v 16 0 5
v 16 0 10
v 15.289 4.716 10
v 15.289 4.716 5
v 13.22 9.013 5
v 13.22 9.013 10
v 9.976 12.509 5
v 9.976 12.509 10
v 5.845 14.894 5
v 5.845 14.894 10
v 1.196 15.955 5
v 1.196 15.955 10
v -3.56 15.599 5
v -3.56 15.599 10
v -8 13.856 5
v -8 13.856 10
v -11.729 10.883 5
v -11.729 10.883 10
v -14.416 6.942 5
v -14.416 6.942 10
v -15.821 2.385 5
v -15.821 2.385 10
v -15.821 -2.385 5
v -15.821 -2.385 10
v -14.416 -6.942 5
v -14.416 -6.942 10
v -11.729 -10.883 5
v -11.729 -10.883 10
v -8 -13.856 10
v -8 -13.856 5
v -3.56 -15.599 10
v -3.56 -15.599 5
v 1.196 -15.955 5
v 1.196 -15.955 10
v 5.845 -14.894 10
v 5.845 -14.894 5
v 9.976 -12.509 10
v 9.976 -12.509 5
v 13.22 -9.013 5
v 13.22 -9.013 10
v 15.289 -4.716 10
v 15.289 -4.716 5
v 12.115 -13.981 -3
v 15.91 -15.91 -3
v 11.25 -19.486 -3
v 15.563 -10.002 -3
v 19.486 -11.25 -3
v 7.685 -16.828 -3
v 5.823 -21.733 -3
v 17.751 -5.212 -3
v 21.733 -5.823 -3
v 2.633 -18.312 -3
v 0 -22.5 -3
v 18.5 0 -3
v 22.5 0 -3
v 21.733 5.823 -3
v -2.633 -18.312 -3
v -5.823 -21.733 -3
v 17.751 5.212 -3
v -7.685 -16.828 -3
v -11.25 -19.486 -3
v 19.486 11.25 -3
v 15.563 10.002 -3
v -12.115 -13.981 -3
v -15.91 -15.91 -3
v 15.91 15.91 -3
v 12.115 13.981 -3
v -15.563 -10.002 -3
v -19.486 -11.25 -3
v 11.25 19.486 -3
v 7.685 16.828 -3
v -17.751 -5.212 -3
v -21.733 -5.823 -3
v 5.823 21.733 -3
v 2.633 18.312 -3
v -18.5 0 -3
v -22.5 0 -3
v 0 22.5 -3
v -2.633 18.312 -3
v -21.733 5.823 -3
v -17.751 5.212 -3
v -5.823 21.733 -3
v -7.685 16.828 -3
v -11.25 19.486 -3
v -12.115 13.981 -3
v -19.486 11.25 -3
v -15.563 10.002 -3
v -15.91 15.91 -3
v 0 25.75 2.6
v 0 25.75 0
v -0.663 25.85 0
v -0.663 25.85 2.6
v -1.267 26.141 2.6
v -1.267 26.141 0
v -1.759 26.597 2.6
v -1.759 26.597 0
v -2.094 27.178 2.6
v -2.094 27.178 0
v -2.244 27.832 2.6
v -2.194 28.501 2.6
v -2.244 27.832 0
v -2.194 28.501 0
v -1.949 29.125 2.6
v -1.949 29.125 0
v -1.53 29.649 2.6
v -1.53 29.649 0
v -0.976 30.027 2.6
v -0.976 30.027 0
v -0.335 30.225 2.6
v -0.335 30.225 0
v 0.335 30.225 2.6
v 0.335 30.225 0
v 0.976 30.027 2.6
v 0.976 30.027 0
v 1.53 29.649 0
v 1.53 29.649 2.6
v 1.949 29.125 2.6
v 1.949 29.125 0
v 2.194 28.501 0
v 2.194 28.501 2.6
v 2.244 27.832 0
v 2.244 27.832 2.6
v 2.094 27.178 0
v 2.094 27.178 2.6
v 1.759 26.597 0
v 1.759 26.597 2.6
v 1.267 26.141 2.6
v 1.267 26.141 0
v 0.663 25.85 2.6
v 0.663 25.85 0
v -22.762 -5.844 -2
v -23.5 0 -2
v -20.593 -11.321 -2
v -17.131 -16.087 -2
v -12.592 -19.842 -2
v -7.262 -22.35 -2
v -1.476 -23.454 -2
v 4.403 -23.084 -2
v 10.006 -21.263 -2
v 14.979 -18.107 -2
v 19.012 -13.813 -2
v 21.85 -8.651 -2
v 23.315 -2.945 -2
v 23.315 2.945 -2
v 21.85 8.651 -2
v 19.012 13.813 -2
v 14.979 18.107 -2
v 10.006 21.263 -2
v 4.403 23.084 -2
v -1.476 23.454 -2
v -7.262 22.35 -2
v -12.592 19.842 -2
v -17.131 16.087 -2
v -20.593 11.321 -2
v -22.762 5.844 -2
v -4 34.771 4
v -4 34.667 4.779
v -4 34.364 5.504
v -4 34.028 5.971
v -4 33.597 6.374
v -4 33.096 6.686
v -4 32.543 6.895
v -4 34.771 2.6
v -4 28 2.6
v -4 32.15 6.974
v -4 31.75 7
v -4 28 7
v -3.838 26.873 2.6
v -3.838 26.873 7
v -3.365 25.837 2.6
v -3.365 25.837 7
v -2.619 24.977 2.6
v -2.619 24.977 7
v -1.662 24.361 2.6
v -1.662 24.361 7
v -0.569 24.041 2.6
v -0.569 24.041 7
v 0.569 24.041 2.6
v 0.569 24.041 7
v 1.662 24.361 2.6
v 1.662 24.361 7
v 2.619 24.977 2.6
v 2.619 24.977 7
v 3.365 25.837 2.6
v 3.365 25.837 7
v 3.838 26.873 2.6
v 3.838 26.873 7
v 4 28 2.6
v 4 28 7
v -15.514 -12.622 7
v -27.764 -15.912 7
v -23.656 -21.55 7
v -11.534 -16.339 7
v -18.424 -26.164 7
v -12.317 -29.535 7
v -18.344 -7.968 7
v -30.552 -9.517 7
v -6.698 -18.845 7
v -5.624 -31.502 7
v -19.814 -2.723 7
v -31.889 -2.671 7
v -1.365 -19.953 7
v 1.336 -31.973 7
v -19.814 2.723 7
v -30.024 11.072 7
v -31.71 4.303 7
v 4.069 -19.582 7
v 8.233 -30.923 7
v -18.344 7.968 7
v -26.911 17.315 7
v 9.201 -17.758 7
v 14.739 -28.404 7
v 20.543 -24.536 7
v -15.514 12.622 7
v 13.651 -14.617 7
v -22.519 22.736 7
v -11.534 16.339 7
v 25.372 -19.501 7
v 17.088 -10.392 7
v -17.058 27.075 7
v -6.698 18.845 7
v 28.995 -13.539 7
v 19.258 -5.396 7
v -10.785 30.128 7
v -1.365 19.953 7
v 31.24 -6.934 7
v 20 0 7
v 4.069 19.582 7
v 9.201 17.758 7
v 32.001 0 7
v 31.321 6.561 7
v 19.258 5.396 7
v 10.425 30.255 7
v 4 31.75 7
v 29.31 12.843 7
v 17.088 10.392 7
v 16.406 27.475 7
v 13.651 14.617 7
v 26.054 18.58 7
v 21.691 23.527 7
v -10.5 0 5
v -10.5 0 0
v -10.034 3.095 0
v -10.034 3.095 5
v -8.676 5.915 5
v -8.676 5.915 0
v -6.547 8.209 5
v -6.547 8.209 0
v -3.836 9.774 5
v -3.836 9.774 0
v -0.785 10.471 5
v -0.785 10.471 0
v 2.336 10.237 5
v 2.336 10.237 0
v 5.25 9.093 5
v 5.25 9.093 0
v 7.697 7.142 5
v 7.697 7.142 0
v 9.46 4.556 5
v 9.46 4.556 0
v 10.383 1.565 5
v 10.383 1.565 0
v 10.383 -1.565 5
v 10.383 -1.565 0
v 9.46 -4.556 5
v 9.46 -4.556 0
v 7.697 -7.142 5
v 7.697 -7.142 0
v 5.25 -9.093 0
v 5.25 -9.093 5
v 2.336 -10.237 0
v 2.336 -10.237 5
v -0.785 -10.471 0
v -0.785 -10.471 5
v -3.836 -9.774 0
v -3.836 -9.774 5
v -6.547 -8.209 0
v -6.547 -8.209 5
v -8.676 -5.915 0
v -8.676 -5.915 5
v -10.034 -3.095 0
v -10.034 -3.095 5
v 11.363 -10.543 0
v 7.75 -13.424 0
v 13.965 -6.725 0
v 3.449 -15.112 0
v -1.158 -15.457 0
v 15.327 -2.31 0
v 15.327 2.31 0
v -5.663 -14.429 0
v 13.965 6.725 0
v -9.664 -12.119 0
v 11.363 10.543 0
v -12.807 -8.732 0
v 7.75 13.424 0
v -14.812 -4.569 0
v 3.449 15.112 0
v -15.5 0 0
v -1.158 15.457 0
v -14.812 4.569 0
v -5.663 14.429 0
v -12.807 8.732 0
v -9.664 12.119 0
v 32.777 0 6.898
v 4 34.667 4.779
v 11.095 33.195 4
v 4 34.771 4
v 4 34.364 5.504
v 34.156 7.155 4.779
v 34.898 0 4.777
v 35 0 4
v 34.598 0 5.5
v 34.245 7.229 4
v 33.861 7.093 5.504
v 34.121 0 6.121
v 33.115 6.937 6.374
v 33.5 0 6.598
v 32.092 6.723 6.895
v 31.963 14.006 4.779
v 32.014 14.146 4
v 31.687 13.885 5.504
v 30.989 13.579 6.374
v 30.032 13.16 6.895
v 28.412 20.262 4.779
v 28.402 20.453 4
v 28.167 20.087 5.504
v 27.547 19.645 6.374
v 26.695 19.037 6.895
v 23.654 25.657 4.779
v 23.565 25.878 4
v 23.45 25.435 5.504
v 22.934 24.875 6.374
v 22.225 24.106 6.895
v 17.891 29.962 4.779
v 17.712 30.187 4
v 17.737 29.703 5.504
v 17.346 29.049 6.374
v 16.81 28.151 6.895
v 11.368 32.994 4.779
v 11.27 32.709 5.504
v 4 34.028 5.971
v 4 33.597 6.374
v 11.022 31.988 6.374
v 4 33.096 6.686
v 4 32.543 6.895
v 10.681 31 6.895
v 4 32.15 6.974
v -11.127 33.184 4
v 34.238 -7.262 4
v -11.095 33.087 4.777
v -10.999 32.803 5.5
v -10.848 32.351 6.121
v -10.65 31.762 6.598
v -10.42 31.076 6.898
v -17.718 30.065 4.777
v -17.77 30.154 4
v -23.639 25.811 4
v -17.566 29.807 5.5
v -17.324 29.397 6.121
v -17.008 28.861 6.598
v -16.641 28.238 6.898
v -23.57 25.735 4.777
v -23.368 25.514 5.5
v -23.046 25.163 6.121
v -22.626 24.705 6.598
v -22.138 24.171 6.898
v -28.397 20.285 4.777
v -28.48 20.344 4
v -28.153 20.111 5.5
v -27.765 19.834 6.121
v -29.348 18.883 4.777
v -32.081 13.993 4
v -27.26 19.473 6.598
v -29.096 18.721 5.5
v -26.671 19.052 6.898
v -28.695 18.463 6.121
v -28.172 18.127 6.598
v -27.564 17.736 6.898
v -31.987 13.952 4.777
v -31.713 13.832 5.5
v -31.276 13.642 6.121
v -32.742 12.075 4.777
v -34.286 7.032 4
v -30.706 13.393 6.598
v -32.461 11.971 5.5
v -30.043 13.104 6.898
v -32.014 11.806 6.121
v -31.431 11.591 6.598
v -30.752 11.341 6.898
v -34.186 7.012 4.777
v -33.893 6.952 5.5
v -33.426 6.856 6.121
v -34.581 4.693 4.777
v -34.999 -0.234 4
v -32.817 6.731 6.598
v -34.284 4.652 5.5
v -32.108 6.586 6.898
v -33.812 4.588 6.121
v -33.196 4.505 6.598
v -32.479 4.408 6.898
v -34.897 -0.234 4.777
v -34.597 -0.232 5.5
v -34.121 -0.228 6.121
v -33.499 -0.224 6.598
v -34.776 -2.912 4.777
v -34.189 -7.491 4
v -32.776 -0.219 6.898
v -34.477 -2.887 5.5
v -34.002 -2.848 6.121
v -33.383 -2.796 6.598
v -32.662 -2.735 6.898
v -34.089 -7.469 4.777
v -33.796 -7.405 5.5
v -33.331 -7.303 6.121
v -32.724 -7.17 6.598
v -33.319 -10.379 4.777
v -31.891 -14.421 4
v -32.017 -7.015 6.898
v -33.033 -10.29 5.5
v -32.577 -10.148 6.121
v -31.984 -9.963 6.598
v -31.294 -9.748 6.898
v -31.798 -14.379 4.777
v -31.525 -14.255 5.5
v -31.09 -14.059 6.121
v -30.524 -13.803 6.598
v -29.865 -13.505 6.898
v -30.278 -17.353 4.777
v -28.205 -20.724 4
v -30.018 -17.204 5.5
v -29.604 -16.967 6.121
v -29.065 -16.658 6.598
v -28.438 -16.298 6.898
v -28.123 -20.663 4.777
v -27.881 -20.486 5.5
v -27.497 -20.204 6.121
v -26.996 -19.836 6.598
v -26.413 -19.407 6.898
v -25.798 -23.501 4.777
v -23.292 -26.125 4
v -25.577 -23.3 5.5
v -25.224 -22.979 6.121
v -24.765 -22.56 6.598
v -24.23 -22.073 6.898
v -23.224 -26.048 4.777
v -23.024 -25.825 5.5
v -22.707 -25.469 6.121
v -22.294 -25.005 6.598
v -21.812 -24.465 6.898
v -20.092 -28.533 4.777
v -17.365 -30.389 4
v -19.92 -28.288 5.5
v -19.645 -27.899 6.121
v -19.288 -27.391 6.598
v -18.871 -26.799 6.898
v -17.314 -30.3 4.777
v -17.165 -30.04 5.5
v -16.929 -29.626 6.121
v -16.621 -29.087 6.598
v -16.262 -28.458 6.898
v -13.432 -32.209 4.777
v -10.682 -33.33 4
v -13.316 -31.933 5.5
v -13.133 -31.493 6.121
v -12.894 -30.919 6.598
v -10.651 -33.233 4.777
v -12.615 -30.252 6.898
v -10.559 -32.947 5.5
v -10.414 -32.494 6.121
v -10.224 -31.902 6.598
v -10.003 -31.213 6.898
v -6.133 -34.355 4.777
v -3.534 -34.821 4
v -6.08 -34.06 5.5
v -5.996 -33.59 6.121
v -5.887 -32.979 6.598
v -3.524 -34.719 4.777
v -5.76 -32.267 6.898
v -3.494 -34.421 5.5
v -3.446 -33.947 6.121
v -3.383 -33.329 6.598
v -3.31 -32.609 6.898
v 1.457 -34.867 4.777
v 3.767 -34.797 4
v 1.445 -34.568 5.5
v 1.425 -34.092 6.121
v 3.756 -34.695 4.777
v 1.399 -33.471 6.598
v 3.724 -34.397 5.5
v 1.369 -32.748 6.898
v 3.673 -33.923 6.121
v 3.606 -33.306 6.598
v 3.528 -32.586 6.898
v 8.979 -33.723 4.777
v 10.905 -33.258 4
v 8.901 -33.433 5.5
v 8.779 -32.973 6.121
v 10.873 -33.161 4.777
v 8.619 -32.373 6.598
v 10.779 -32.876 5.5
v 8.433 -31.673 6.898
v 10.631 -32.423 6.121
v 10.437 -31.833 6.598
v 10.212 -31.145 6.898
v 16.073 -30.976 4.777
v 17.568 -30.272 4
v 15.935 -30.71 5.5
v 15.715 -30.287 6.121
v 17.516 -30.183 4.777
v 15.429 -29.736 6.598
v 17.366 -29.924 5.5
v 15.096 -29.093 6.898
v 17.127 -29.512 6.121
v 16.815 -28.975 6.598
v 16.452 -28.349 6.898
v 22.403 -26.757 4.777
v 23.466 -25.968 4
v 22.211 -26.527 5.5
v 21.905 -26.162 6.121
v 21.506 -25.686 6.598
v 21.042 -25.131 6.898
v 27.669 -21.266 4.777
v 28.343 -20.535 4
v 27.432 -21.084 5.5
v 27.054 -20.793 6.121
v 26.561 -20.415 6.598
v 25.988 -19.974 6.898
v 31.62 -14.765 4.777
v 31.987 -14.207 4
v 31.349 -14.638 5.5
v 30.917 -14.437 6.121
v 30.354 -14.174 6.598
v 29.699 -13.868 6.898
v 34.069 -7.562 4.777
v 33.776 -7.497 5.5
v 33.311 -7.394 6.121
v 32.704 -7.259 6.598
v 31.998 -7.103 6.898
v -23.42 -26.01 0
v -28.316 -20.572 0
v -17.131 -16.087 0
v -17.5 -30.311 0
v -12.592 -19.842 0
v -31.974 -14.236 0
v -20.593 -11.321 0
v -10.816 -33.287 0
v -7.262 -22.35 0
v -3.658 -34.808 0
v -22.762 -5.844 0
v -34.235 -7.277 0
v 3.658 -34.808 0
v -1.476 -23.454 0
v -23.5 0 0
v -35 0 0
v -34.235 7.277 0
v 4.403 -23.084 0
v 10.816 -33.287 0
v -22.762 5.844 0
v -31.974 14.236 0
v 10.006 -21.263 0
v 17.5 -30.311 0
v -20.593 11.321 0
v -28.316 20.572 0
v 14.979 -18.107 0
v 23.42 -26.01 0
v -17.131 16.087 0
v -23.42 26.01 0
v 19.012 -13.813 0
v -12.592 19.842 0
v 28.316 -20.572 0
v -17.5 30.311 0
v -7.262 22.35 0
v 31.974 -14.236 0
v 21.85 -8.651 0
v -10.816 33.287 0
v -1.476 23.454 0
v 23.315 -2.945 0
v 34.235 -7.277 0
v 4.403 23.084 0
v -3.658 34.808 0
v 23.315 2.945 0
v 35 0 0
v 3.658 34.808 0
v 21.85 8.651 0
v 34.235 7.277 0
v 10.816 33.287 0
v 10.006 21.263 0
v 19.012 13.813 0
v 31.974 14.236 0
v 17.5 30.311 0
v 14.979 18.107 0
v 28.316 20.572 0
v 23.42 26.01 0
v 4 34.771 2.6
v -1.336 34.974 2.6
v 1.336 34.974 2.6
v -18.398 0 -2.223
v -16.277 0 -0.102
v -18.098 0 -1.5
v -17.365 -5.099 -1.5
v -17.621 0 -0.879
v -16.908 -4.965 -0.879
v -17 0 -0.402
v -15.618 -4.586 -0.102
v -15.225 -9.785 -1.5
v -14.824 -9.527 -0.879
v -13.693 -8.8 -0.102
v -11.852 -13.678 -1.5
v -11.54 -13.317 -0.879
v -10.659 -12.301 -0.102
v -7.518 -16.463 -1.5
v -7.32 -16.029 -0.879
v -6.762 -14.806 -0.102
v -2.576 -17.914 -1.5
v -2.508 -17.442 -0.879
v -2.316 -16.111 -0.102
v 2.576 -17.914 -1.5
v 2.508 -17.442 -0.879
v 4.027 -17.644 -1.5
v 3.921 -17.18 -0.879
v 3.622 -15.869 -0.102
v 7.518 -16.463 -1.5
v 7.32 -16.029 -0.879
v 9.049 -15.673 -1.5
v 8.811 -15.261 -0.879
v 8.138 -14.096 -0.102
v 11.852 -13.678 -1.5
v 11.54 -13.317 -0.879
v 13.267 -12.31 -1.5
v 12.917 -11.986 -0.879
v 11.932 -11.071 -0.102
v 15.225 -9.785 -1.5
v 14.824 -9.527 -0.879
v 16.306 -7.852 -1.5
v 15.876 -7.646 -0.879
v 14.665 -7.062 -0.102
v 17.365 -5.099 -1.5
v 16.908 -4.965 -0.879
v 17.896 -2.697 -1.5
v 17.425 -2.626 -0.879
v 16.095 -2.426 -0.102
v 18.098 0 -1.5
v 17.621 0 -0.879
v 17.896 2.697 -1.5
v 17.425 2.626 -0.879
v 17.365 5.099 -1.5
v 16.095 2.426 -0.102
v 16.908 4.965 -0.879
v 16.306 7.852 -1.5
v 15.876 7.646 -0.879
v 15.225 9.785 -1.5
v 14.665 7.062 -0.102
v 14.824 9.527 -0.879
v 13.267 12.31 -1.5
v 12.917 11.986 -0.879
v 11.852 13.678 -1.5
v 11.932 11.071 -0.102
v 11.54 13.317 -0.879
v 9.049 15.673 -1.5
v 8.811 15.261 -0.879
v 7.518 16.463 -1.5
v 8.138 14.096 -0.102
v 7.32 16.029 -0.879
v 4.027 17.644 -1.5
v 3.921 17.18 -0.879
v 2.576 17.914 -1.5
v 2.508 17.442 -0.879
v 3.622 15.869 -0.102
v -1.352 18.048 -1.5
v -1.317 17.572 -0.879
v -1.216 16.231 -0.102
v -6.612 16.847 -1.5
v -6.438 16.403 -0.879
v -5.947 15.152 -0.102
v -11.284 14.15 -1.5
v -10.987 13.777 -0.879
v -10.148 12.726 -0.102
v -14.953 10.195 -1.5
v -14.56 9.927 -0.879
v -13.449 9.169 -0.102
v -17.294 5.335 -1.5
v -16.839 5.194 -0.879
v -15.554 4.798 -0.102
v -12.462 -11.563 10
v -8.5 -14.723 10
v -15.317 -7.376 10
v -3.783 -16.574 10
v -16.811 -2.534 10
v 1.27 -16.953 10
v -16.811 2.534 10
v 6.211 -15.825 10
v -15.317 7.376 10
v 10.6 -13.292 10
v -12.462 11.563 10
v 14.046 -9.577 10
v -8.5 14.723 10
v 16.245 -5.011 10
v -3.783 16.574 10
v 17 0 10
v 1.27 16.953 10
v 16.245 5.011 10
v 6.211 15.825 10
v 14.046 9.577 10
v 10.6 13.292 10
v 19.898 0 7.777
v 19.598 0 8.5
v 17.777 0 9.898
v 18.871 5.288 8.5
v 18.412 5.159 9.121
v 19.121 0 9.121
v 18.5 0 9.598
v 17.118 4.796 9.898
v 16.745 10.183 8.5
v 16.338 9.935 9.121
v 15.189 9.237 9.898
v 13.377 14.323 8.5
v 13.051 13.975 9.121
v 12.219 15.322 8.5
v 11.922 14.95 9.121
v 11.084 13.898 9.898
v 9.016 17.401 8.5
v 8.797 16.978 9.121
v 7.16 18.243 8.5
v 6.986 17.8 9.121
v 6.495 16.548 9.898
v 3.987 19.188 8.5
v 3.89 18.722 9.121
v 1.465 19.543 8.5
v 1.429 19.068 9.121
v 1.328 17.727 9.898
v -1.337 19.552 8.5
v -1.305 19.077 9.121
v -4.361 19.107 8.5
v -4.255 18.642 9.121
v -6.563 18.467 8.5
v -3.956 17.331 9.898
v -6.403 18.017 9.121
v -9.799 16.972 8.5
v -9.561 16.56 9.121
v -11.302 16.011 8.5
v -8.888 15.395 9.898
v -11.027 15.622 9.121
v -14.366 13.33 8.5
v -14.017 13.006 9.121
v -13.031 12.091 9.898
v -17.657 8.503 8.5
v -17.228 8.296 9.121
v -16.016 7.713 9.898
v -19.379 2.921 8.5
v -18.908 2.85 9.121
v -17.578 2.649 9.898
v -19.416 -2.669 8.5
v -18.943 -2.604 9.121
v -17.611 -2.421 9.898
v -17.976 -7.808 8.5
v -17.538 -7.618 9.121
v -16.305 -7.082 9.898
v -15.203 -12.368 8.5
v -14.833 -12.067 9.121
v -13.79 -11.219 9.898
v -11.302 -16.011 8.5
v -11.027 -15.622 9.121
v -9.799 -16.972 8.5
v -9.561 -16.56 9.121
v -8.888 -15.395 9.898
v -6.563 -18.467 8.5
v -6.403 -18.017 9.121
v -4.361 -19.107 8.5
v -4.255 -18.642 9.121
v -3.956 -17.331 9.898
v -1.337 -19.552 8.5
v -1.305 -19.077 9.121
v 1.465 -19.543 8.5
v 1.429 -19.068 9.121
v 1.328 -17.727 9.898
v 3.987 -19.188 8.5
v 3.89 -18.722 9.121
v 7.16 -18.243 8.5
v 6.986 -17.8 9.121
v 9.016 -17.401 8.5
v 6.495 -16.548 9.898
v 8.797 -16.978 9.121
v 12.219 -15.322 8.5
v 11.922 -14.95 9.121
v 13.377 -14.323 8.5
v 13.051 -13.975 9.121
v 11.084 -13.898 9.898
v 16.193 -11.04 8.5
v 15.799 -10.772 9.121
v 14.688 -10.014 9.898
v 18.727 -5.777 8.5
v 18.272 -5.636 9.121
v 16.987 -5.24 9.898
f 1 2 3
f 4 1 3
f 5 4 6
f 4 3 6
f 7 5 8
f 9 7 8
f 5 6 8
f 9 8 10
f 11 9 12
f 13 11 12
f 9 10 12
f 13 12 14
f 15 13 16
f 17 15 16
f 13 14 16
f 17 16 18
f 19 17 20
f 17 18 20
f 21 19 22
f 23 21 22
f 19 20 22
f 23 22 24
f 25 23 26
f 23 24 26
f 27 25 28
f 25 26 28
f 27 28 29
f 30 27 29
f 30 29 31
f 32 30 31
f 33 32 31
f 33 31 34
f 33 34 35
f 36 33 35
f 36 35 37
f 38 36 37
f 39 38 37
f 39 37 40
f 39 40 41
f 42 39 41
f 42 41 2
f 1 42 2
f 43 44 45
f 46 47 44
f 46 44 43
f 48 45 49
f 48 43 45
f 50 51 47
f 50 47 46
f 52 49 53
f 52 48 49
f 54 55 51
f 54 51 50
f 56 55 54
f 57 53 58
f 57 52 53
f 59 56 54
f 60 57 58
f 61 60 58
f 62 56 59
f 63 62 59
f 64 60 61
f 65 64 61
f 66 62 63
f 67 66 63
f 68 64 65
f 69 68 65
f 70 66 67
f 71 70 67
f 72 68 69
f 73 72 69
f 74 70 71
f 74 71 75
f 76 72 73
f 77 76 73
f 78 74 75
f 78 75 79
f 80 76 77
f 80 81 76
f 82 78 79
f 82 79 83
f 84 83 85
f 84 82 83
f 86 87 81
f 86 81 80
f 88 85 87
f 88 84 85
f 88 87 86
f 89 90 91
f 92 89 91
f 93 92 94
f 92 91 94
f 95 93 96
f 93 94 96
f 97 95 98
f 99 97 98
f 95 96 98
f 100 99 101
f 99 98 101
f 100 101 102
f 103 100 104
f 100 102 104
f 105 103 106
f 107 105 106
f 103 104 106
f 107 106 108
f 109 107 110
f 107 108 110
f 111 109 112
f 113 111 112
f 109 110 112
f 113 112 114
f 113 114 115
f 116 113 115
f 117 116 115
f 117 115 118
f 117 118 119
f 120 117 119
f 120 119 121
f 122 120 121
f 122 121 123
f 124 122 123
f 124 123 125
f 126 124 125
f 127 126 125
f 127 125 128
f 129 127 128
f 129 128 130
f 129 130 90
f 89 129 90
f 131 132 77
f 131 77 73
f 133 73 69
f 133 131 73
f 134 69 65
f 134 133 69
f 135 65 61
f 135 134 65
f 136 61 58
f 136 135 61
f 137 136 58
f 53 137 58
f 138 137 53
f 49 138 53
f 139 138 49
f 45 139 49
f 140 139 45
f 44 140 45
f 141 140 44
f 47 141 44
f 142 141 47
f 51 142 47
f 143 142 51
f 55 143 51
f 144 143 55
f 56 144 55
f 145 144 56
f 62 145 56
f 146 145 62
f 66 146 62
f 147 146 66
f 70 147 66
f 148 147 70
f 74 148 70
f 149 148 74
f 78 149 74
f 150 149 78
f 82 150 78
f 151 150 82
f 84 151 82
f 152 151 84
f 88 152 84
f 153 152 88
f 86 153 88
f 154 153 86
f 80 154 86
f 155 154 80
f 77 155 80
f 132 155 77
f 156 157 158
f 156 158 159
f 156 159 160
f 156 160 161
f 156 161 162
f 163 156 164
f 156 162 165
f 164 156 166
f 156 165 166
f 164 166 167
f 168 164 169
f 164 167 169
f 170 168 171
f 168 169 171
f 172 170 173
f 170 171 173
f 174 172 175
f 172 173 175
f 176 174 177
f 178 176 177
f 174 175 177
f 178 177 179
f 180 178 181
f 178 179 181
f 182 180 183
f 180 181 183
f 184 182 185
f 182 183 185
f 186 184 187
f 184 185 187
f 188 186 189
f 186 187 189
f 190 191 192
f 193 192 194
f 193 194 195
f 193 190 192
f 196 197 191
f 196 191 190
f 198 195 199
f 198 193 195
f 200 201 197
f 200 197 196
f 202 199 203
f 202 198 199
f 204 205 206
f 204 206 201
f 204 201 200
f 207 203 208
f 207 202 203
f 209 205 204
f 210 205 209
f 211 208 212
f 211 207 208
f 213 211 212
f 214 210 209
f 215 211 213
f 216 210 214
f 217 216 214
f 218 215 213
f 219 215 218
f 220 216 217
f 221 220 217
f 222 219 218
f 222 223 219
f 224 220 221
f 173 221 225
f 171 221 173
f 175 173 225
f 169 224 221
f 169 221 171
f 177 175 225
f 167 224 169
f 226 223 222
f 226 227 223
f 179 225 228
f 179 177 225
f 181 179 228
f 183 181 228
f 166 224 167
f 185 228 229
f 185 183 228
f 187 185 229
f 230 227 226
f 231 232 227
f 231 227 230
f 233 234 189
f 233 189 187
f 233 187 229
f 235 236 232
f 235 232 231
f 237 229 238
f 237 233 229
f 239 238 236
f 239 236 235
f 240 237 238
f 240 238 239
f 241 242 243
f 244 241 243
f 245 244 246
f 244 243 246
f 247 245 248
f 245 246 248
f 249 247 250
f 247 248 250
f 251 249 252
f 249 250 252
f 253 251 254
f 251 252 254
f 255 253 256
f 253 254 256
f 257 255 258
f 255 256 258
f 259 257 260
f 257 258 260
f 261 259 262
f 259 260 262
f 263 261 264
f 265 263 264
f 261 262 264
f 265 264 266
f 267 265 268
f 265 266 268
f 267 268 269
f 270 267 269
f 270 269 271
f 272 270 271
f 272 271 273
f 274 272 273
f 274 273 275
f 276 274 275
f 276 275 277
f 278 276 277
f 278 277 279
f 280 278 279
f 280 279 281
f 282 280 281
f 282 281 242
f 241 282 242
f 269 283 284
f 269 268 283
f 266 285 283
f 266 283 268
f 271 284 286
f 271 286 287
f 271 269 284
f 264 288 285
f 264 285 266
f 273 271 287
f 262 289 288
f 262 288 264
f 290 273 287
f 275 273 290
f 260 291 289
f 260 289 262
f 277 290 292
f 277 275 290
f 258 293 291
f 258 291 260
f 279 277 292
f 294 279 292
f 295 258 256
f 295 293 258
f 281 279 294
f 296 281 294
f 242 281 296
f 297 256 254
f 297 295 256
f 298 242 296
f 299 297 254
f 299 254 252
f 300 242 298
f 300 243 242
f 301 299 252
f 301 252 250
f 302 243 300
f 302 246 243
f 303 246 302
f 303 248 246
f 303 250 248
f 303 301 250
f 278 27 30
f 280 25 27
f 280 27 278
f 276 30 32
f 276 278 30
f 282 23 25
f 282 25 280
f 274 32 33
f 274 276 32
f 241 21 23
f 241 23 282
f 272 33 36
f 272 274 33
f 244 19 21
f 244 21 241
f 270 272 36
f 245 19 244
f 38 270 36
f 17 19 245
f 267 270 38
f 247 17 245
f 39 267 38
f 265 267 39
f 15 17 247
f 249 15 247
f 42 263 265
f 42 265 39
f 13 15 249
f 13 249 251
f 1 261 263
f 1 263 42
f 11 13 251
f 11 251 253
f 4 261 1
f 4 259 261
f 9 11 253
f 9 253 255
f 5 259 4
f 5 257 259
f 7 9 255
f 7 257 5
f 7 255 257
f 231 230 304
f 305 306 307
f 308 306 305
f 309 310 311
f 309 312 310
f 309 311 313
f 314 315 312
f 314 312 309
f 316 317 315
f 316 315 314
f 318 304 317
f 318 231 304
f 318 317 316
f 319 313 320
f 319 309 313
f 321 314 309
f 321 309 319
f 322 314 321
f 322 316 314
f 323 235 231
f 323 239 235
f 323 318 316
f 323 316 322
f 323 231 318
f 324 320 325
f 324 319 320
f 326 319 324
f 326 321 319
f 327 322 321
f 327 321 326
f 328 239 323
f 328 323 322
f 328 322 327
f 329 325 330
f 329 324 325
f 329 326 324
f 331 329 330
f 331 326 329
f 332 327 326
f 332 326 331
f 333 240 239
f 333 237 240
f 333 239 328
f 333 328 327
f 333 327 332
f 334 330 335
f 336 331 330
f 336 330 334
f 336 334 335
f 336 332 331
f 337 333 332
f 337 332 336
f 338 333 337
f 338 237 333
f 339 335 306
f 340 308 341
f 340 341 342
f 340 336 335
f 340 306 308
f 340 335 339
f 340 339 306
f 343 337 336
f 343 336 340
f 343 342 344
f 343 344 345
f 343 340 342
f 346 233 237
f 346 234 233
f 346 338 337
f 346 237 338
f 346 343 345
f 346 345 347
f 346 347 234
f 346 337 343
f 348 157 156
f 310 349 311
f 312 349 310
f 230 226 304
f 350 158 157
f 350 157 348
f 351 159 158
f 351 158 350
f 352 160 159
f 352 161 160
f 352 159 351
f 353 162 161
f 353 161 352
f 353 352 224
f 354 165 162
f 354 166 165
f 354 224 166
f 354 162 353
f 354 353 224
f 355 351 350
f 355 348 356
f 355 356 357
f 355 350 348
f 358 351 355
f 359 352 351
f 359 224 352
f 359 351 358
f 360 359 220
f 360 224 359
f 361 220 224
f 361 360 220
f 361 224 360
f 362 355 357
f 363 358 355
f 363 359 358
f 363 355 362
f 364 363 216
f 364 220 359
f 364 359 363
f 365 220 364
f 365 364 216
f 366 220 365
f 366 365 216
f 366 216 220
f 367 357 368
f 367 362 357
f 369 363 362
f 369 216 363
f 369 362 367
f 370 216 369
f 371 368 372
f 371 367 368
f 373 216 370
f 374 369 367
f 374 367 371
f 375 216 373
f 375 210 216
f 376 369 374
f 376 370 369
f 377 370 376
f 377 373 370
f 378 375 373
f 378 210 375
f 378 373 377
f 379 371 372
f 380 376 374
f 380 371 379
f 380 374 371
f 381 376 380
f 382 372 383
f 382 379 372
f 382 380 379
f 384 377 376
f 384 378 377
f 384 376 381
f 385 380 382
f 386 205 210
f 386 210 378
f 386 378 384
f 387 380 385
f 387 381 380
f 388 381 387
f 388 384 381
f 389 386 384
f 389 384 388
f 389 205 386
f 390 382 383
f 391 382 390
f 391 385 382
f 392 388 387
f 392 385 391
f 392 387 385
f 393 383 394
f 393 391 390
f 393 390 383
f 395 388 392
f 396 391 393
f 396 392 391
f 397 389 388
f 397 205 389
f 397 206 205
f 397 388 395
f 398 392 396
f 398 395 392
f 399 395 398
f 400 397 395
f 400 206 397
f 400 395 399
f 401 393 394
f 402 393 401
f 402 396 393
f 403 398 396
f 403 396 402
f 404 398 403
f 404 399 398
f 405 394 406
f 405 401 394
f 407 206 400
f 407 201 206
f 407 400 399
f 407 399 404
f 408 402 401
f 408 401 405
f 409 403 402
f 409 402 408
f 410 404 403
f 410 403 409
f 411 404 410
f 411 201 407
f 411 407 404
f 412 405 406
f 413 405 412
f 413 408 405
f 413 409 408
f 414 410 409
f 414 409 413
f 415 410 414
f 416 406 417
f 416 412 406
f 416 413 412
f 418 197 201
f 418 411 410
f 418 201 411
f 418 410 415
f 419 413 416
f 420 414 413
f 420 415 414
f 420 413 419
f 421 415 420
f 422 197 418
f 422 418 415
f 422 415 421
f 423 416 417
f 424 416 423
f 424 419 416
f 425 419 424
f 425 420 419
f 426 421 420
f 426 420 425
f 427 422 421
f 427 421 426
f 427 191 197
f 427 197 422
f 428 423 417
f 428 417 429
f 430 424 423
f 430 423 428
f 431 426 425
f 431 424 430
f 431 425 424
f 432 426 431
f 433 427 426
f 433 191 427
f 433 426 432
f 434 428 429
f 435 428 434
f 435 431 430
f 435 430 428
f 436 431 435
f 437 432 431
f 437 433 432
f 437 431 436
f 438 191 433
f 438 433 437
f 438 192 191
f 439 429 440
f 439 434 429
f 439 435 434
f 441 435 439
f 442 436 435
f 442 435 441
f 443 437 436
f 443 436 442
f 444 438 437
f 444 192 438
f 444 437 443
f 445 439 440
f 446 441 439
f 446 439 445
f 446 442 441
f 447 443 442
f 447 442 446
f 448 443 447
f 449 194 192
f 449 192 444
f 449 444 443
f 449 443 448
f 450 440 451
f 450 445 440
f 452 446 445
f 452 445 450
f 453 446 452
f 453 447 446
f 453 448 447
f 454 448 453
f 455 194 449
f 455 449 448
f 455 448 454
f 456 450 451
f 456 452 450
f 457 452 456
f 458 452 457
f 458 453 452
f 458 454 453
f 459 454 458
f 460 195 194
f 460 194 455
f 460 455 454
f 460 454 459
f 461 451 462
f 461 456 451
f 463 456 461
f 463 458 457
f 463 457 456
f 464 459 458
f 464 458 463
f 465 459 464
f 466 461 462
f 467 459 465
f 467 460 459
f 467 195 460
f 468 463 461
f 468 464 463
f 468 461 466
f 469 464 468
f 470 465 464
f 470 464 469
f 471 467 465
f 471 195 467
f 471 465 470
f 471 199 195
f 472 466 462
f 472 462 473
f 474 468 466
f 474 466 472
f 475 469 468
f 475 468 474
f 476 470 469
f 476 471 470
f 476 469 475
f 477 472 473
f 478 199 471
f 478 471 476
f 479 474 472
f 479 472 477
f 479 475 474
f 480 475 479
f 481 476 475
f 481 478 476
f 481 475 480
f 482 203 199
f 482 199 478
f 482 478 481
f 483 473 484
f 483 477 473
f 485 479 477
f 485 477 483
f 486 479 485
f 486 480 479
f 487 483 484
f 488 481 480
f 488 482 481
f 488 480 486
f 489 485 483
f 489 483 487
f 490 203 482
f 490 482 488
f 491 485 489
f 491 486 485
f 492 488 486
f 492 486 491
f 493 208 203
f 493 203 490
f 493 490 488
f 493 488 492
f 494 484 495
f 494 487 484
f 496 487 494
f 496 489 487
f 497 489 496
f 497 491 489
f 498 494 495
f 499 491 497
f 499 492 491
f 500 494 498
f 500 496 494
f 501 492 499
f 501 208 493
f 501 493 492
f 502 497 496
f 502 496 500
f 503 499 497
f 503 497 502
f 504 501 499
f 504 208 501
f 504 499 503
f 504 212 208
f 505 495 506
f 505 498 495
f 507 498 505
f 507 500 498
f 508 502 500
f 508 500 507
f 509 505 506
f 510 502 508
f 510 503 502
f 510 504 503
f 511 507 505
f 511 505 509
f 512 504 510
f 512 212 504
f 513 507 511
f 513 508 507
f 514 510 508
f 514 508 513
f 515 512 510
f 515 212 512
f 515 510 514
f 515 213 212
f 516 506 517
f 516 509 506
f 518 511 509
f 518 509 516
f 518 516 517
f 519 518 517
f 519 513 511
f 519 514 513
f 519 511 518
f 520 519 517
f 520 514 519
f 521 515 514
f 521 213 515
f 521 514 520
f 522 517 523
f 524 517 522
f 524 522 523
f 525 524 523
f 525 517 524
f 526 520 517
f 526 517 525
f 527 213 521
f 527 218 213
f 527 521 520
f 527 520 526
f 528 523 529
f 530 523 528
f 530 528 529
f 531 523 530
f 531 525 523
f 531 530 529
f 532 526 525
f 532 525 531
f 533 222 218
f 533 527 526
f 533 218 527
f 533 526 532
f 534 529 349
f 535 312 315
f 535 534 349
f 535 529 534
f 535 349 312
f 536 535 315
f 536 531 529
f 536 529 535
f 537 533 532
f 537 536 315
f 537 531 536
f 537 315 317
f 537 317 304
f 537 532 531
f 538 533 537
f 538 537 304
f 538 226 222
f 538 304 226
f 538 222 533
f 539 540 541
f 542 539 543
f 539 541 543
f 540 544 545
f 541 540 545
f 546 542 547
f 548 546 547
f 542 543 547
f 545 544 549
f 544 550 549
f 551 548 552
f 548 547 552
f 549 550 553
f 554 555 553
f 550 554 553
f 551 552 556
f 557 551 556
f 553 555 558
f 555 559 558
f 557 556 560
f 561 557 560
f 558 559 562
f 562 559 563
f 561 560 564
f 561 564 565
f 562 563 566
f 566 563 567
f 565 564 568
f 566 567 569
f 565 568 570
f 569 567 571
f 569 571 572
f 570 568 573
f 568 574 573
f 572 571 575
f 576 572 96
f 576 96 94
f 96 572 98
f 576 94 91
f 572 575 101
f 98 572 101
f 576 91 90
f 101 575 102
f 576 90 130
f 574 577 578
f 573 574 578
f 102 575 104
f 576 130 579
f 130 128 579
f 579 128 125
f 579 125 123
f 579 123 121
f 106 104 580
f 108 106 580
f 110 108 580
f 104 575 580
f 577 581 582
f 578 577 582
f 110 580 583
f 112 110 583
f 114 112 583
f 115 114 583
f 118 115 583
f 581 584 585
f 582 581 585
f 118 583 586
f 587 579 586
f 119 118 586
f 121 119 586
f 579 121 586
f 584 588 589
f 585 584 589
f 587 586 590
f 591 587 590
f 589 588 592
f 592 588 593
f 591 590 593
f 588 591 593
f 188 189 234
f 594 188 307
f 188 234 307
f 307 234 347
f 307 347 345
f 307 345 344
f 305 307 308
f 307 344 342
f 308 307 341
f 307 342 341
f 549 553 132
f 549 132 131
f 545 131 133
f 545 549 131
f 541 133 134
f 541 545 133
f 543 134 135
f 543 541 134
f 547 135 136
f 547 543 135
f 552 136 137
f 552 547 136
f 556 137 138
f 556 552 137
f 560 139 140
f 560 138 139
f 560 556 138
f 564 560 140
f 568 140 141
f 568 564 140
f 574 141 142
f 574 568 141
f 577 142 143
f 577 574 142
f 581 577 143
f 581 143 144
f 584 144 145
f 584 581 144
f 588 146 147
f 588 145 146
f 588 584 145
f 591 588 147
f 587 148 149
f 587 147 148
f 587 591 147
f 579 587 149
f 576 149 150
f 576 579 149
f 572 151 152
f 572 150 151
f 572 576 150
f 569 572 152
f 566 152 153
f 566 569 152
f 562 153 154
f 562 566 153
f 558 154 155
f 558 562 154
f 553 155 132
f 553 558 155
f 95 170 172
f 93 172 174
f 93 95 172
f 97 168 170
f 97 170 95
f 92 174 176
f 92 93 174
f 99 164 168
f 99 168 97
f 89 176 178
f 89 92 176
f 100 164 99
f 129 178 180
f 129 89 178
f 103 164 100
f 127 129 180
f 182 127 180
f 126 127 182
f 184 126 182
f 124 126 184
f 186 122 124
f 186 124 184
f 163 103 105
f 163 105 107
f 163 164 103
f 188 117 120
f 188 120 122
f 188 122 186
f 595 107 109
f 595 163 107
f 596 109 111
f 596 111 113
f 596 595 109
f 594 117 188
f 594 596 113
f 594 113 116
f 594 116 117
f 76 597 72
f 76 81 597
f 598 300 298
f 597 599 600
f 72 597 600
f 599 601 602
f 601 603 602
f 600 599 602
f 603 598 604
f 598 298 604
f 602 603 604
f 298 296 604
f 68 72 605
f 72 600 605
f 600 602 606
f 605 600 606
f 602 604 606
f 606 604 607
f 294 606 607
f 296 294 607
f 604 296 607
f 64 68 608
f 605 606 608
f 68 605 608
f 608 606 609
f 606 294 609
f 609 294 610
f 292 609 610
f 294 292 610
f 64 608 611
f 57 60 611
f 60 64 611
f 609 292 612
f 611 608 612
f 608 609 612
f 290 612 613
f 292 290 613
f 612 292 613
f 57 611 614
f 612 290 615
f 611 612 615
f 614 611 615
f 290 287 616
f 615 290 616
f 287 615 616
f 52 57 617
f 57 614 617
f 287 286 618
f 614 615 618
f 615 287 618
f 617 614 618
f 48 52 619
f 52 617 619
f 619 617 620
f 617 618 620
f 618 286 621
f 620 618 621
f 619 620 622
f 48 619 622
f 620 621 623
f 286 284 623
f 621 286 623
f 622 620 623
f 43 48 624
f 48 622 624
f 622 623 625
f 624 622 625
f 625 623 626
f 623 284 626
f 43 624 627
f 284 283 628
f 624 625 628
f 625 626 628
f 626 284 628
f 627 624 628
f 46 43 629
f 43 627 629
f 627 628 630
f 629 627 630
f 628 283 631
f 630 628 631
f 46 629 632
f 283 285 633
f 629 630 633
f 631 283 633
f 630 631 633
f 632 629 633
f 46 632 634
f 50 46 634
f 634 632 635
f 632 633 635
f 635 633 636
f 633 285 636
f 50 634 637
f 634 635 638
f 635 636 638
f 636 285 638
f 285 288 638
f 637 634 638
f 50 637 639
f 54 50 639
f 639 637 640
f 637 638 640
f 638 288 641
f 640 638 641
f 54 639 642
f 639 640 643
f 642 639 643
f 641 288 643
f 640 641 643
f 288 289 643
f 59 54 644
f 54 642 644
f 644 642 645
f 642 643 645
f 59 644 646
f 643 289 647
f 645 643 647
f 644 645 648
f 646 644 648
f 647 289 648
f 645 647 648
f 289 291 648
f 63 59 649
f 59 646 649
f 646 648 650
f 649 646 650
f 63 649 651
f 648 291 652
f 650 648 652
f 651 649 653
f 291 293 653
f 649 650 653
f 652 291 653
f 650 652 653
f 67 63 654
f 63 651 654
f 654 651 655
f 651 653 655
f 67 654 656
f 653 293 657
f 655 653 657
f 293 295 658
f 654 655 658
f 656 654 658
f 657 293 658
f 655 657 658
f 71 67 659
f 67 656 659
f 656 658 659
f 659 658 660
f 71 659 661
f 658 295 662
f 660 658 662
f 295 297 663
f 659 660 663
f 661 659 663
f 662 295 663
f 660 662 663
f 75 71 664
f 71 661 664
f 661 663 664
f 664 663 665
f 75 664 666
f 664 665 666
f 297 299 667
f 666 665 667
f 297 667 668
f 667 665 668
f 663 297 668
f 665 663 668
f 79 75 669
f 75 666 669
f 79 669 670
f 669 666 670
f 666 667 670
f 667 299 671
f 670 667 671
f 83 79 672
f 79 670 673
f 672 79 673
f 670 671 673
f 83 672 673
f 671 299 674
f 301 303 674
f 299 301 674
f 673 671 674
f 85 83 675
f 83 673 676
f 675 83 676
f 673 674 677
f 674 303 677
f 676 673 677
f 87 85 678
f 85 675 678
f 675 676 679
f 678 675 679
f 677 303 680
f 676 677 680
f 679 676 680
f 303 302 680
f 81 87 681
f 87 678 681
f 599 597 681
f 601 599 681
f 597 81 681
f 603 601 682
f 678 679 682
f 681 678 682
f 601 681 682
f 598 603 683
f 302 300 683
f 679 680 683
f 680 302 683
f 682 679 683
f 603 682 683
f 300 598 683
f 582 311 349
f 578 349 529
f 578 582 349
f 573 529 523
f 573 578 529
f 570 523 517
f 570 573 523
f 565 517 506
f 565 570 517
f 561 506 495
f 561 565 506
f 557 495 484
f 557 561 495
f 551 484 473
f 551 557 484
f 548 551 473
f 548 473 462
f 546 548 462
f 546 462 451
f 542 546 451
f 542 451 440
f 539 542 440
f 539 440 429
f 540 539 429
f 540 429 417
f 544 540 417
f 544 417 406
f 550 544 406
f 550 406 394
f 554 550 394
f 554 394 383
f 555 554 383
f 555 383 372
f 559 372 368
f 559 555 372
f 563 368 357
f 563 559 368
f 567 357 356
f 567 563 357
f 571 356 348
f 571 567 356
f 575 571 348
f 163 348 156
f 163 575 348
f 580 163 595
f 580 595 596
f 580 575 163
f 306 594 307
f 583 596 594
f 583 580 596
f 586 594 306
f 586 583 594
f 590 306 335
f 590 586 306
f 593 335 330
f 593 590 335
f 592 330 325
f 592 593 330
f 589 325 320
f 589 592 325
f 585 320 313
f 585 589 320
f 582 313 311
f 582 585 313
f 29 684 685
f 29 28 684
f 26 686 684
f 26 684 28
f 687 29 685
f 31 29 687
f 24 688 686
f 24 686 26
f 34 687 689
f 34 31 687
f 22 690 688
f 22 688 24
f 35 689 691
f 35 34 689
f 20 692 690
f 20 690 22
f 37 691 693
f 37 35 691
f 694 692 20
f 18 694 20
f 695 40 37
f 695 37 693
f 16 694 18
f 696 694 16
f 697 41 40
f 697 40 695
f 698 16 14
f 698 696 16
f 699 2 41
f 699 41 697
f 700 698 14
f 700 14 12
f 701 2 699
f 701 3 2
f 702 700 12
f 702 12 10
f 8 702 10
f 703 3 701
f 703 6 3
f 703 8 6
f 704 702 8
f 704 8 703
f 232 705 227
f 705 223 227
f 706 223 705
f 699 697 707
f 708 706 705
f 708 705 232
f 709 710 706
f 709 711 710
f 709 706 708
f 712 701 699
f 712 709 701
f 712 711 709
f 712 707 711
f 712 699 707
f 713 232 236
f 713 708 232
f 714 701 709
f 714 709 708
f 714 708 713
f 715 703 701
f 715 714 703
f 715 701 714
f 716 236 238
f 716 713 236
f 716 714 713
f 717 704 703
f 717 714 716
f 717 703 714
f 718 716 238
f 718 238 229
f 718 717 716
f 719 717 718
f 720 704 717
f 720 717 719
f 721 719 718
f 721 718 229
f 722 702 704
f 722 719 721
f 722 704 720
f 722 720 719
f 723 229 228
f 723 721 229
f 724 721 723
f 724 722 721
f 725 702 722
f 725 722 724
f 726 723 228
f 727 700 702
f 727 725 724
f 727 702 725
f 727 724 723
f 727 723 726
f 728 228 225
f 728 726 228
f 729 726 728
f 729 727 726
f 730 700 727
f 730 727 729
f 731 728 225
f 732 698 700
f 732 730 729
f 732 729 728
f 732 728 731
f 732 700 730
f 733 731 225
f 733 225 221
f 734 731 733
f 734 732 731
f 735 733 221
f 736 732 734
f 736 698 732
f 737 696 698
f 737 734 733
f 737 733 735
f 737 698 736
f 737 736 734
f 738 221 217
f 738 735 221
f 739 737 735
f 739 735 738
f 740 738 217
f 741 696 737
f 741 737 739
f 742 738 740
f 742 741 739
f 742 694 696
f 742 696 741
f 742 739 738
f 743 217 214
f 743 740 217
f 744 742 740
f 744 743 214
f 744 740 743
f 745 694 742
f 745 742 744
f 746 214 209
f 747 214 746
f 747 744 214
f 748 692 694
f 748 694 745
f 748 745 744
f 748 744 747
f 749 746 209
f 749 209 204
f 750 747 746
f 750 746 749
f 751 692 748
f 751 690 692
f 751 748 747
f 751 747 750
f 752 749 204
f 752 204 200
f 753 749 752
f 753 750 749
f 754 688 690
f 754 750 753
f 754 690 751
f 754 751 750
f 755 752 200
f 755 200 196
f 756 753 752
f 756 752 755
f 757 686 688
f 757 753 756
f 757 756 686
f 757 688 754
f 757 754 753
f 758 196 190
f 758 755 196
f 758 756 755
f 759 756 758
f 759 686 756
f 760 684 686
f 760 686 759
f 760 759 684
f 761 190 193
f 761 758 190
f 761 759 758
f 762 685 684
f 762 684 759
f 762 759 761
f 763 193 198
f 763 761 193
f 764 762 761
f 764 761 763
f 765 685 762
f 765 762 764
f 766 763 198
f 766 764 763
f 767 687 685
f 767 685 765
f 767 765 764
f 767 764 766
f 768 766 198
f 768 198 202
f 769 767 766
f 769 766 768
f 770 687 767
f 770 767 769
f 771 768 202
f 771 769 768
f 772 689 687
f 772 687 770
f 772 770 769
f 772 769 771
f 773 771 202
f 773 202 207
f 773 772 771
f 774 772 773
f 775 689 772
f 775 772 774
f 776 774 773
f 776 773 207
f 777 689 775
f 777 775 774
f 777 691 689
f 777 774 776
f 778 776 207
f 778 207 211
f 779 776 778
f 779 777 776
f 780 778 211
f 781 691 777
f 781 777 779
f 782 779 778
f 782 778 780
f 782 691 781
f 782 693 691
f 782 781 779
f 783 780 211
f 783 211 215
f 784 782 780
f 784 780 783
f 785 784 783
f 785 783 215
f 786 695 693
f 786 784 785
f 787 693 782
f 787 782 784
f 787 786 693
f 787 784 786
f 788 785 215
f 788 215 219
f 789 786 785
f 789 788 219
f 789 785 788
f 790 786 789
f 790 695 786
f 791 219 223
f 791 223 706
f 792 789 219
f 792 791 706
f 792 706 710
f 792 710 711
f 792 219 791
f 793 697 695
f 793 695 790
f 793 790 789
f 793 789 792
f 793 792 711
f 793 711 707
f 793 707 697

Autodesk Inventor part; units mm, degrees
ref_plane "YZ Plane" through (0, 0, 0) normal (1, 0, 0) x (0, 1, 0)
ref_plane "XZ Plane" through (0, 0, 0) normal (0, 1, 0) x (-1, 0, 0)
ref_plane "XY Plane" through (0, 0, 0) normal (0, 0, 1) x (1, 0, 0)
sketch "스케치13" plane through (0, 0, 0) normal (0, 0, 1) x (1, 0, 0)
  circle A0 centre (0, 0) radius 35
  dimension "d74" = 70
extrude "돌출11" add sketch "스케치13" along normal blind 7
sketch "스케치19" plane through (0, 0, 7) normal (0, 0, 1) x (1, 0, 0)
  circle A0 centre (0, 0) radius 20
  dimension "d92" = 40
extrude "돌출17" add sketch "스케치19" along normal blind 3
sketch "스케치20" plane through (0, 0, 10) normal (0, 0, 1) x (1, 0, 0)
  circle A0 centre (0, 0) radius 16
  dimension "d95" = 32
extrude "돌출18" cut sketch "스케치20" against normal blind 5
sketch "스케치16" plane through (0, 0, 0) normal (0, 0, -1) x (-1, 0, 0)
  circle A0 centre (0, 0) radius 23.5
  dimension "d83" = 47
extrude "돌출15" add sketch "스케치16" along normal blind 3
sketch "스케치23" plane through (0, 0, -3) normal (0, 0, -1) x (-1, 0, 0)
  circle A0 centre (0, 0) radius 18.5
  dimension "d117" = 37
extrude "돌출20" cut sketch "스케치23" against normal blind 3
sketch "스케치18" plane through (0, 0, -3) normal (0, 0, -1) x (-1, 0, 0)
  circle A0 centre (0, 0) radius 10.5
  dimension "d89" = 21
extrude "돌출16" cut sketch "스케치18" against normal up to next
sketch "스케치21" plane through (0, 0, 7) normal (0, 0, 1) x (1, 0, 0)
  circle A0 centre (0, 28) radius 4
  line L0 (-4, 28) -> (4, 28)
  line L1 (4, 28) -> (4, 38)
  line L2 (4, 38) -> (-4, 38)
  line L3 (-4, 38) -> (-4, 28)
  point P0 (0, 0)
  dimension "d99" = 8
  dimension "d100" = 28
extrude "돌출19" cut sketch "스케치21" against normal blind 4.4
sketch "스케치22" plane through (0, 0, 2.6) normal (0, 0, 1) x (1, 0, 0)
  arc A0 (-4, 28) -> (4, 28) centre (0, 28) ccw projected
  circle A1 centre (0, 28) radius 4
  point P0 (0, 0)
hole "구멍2" at (0, 28, 2.6) direction (0, 0, -1) diameter 4.5 end through all
fillet "모깎기7" radius 3 4 edges at (-23.2916, -26.1247, 7) (26.1247, 23.2916, 7) (-20, 0, 10) (18.5, 0, 0)
chamfer "모따기6" distance 1 angle 45 1 edges at (23.5, 0, -3)
properties part number "도면3-2번"
